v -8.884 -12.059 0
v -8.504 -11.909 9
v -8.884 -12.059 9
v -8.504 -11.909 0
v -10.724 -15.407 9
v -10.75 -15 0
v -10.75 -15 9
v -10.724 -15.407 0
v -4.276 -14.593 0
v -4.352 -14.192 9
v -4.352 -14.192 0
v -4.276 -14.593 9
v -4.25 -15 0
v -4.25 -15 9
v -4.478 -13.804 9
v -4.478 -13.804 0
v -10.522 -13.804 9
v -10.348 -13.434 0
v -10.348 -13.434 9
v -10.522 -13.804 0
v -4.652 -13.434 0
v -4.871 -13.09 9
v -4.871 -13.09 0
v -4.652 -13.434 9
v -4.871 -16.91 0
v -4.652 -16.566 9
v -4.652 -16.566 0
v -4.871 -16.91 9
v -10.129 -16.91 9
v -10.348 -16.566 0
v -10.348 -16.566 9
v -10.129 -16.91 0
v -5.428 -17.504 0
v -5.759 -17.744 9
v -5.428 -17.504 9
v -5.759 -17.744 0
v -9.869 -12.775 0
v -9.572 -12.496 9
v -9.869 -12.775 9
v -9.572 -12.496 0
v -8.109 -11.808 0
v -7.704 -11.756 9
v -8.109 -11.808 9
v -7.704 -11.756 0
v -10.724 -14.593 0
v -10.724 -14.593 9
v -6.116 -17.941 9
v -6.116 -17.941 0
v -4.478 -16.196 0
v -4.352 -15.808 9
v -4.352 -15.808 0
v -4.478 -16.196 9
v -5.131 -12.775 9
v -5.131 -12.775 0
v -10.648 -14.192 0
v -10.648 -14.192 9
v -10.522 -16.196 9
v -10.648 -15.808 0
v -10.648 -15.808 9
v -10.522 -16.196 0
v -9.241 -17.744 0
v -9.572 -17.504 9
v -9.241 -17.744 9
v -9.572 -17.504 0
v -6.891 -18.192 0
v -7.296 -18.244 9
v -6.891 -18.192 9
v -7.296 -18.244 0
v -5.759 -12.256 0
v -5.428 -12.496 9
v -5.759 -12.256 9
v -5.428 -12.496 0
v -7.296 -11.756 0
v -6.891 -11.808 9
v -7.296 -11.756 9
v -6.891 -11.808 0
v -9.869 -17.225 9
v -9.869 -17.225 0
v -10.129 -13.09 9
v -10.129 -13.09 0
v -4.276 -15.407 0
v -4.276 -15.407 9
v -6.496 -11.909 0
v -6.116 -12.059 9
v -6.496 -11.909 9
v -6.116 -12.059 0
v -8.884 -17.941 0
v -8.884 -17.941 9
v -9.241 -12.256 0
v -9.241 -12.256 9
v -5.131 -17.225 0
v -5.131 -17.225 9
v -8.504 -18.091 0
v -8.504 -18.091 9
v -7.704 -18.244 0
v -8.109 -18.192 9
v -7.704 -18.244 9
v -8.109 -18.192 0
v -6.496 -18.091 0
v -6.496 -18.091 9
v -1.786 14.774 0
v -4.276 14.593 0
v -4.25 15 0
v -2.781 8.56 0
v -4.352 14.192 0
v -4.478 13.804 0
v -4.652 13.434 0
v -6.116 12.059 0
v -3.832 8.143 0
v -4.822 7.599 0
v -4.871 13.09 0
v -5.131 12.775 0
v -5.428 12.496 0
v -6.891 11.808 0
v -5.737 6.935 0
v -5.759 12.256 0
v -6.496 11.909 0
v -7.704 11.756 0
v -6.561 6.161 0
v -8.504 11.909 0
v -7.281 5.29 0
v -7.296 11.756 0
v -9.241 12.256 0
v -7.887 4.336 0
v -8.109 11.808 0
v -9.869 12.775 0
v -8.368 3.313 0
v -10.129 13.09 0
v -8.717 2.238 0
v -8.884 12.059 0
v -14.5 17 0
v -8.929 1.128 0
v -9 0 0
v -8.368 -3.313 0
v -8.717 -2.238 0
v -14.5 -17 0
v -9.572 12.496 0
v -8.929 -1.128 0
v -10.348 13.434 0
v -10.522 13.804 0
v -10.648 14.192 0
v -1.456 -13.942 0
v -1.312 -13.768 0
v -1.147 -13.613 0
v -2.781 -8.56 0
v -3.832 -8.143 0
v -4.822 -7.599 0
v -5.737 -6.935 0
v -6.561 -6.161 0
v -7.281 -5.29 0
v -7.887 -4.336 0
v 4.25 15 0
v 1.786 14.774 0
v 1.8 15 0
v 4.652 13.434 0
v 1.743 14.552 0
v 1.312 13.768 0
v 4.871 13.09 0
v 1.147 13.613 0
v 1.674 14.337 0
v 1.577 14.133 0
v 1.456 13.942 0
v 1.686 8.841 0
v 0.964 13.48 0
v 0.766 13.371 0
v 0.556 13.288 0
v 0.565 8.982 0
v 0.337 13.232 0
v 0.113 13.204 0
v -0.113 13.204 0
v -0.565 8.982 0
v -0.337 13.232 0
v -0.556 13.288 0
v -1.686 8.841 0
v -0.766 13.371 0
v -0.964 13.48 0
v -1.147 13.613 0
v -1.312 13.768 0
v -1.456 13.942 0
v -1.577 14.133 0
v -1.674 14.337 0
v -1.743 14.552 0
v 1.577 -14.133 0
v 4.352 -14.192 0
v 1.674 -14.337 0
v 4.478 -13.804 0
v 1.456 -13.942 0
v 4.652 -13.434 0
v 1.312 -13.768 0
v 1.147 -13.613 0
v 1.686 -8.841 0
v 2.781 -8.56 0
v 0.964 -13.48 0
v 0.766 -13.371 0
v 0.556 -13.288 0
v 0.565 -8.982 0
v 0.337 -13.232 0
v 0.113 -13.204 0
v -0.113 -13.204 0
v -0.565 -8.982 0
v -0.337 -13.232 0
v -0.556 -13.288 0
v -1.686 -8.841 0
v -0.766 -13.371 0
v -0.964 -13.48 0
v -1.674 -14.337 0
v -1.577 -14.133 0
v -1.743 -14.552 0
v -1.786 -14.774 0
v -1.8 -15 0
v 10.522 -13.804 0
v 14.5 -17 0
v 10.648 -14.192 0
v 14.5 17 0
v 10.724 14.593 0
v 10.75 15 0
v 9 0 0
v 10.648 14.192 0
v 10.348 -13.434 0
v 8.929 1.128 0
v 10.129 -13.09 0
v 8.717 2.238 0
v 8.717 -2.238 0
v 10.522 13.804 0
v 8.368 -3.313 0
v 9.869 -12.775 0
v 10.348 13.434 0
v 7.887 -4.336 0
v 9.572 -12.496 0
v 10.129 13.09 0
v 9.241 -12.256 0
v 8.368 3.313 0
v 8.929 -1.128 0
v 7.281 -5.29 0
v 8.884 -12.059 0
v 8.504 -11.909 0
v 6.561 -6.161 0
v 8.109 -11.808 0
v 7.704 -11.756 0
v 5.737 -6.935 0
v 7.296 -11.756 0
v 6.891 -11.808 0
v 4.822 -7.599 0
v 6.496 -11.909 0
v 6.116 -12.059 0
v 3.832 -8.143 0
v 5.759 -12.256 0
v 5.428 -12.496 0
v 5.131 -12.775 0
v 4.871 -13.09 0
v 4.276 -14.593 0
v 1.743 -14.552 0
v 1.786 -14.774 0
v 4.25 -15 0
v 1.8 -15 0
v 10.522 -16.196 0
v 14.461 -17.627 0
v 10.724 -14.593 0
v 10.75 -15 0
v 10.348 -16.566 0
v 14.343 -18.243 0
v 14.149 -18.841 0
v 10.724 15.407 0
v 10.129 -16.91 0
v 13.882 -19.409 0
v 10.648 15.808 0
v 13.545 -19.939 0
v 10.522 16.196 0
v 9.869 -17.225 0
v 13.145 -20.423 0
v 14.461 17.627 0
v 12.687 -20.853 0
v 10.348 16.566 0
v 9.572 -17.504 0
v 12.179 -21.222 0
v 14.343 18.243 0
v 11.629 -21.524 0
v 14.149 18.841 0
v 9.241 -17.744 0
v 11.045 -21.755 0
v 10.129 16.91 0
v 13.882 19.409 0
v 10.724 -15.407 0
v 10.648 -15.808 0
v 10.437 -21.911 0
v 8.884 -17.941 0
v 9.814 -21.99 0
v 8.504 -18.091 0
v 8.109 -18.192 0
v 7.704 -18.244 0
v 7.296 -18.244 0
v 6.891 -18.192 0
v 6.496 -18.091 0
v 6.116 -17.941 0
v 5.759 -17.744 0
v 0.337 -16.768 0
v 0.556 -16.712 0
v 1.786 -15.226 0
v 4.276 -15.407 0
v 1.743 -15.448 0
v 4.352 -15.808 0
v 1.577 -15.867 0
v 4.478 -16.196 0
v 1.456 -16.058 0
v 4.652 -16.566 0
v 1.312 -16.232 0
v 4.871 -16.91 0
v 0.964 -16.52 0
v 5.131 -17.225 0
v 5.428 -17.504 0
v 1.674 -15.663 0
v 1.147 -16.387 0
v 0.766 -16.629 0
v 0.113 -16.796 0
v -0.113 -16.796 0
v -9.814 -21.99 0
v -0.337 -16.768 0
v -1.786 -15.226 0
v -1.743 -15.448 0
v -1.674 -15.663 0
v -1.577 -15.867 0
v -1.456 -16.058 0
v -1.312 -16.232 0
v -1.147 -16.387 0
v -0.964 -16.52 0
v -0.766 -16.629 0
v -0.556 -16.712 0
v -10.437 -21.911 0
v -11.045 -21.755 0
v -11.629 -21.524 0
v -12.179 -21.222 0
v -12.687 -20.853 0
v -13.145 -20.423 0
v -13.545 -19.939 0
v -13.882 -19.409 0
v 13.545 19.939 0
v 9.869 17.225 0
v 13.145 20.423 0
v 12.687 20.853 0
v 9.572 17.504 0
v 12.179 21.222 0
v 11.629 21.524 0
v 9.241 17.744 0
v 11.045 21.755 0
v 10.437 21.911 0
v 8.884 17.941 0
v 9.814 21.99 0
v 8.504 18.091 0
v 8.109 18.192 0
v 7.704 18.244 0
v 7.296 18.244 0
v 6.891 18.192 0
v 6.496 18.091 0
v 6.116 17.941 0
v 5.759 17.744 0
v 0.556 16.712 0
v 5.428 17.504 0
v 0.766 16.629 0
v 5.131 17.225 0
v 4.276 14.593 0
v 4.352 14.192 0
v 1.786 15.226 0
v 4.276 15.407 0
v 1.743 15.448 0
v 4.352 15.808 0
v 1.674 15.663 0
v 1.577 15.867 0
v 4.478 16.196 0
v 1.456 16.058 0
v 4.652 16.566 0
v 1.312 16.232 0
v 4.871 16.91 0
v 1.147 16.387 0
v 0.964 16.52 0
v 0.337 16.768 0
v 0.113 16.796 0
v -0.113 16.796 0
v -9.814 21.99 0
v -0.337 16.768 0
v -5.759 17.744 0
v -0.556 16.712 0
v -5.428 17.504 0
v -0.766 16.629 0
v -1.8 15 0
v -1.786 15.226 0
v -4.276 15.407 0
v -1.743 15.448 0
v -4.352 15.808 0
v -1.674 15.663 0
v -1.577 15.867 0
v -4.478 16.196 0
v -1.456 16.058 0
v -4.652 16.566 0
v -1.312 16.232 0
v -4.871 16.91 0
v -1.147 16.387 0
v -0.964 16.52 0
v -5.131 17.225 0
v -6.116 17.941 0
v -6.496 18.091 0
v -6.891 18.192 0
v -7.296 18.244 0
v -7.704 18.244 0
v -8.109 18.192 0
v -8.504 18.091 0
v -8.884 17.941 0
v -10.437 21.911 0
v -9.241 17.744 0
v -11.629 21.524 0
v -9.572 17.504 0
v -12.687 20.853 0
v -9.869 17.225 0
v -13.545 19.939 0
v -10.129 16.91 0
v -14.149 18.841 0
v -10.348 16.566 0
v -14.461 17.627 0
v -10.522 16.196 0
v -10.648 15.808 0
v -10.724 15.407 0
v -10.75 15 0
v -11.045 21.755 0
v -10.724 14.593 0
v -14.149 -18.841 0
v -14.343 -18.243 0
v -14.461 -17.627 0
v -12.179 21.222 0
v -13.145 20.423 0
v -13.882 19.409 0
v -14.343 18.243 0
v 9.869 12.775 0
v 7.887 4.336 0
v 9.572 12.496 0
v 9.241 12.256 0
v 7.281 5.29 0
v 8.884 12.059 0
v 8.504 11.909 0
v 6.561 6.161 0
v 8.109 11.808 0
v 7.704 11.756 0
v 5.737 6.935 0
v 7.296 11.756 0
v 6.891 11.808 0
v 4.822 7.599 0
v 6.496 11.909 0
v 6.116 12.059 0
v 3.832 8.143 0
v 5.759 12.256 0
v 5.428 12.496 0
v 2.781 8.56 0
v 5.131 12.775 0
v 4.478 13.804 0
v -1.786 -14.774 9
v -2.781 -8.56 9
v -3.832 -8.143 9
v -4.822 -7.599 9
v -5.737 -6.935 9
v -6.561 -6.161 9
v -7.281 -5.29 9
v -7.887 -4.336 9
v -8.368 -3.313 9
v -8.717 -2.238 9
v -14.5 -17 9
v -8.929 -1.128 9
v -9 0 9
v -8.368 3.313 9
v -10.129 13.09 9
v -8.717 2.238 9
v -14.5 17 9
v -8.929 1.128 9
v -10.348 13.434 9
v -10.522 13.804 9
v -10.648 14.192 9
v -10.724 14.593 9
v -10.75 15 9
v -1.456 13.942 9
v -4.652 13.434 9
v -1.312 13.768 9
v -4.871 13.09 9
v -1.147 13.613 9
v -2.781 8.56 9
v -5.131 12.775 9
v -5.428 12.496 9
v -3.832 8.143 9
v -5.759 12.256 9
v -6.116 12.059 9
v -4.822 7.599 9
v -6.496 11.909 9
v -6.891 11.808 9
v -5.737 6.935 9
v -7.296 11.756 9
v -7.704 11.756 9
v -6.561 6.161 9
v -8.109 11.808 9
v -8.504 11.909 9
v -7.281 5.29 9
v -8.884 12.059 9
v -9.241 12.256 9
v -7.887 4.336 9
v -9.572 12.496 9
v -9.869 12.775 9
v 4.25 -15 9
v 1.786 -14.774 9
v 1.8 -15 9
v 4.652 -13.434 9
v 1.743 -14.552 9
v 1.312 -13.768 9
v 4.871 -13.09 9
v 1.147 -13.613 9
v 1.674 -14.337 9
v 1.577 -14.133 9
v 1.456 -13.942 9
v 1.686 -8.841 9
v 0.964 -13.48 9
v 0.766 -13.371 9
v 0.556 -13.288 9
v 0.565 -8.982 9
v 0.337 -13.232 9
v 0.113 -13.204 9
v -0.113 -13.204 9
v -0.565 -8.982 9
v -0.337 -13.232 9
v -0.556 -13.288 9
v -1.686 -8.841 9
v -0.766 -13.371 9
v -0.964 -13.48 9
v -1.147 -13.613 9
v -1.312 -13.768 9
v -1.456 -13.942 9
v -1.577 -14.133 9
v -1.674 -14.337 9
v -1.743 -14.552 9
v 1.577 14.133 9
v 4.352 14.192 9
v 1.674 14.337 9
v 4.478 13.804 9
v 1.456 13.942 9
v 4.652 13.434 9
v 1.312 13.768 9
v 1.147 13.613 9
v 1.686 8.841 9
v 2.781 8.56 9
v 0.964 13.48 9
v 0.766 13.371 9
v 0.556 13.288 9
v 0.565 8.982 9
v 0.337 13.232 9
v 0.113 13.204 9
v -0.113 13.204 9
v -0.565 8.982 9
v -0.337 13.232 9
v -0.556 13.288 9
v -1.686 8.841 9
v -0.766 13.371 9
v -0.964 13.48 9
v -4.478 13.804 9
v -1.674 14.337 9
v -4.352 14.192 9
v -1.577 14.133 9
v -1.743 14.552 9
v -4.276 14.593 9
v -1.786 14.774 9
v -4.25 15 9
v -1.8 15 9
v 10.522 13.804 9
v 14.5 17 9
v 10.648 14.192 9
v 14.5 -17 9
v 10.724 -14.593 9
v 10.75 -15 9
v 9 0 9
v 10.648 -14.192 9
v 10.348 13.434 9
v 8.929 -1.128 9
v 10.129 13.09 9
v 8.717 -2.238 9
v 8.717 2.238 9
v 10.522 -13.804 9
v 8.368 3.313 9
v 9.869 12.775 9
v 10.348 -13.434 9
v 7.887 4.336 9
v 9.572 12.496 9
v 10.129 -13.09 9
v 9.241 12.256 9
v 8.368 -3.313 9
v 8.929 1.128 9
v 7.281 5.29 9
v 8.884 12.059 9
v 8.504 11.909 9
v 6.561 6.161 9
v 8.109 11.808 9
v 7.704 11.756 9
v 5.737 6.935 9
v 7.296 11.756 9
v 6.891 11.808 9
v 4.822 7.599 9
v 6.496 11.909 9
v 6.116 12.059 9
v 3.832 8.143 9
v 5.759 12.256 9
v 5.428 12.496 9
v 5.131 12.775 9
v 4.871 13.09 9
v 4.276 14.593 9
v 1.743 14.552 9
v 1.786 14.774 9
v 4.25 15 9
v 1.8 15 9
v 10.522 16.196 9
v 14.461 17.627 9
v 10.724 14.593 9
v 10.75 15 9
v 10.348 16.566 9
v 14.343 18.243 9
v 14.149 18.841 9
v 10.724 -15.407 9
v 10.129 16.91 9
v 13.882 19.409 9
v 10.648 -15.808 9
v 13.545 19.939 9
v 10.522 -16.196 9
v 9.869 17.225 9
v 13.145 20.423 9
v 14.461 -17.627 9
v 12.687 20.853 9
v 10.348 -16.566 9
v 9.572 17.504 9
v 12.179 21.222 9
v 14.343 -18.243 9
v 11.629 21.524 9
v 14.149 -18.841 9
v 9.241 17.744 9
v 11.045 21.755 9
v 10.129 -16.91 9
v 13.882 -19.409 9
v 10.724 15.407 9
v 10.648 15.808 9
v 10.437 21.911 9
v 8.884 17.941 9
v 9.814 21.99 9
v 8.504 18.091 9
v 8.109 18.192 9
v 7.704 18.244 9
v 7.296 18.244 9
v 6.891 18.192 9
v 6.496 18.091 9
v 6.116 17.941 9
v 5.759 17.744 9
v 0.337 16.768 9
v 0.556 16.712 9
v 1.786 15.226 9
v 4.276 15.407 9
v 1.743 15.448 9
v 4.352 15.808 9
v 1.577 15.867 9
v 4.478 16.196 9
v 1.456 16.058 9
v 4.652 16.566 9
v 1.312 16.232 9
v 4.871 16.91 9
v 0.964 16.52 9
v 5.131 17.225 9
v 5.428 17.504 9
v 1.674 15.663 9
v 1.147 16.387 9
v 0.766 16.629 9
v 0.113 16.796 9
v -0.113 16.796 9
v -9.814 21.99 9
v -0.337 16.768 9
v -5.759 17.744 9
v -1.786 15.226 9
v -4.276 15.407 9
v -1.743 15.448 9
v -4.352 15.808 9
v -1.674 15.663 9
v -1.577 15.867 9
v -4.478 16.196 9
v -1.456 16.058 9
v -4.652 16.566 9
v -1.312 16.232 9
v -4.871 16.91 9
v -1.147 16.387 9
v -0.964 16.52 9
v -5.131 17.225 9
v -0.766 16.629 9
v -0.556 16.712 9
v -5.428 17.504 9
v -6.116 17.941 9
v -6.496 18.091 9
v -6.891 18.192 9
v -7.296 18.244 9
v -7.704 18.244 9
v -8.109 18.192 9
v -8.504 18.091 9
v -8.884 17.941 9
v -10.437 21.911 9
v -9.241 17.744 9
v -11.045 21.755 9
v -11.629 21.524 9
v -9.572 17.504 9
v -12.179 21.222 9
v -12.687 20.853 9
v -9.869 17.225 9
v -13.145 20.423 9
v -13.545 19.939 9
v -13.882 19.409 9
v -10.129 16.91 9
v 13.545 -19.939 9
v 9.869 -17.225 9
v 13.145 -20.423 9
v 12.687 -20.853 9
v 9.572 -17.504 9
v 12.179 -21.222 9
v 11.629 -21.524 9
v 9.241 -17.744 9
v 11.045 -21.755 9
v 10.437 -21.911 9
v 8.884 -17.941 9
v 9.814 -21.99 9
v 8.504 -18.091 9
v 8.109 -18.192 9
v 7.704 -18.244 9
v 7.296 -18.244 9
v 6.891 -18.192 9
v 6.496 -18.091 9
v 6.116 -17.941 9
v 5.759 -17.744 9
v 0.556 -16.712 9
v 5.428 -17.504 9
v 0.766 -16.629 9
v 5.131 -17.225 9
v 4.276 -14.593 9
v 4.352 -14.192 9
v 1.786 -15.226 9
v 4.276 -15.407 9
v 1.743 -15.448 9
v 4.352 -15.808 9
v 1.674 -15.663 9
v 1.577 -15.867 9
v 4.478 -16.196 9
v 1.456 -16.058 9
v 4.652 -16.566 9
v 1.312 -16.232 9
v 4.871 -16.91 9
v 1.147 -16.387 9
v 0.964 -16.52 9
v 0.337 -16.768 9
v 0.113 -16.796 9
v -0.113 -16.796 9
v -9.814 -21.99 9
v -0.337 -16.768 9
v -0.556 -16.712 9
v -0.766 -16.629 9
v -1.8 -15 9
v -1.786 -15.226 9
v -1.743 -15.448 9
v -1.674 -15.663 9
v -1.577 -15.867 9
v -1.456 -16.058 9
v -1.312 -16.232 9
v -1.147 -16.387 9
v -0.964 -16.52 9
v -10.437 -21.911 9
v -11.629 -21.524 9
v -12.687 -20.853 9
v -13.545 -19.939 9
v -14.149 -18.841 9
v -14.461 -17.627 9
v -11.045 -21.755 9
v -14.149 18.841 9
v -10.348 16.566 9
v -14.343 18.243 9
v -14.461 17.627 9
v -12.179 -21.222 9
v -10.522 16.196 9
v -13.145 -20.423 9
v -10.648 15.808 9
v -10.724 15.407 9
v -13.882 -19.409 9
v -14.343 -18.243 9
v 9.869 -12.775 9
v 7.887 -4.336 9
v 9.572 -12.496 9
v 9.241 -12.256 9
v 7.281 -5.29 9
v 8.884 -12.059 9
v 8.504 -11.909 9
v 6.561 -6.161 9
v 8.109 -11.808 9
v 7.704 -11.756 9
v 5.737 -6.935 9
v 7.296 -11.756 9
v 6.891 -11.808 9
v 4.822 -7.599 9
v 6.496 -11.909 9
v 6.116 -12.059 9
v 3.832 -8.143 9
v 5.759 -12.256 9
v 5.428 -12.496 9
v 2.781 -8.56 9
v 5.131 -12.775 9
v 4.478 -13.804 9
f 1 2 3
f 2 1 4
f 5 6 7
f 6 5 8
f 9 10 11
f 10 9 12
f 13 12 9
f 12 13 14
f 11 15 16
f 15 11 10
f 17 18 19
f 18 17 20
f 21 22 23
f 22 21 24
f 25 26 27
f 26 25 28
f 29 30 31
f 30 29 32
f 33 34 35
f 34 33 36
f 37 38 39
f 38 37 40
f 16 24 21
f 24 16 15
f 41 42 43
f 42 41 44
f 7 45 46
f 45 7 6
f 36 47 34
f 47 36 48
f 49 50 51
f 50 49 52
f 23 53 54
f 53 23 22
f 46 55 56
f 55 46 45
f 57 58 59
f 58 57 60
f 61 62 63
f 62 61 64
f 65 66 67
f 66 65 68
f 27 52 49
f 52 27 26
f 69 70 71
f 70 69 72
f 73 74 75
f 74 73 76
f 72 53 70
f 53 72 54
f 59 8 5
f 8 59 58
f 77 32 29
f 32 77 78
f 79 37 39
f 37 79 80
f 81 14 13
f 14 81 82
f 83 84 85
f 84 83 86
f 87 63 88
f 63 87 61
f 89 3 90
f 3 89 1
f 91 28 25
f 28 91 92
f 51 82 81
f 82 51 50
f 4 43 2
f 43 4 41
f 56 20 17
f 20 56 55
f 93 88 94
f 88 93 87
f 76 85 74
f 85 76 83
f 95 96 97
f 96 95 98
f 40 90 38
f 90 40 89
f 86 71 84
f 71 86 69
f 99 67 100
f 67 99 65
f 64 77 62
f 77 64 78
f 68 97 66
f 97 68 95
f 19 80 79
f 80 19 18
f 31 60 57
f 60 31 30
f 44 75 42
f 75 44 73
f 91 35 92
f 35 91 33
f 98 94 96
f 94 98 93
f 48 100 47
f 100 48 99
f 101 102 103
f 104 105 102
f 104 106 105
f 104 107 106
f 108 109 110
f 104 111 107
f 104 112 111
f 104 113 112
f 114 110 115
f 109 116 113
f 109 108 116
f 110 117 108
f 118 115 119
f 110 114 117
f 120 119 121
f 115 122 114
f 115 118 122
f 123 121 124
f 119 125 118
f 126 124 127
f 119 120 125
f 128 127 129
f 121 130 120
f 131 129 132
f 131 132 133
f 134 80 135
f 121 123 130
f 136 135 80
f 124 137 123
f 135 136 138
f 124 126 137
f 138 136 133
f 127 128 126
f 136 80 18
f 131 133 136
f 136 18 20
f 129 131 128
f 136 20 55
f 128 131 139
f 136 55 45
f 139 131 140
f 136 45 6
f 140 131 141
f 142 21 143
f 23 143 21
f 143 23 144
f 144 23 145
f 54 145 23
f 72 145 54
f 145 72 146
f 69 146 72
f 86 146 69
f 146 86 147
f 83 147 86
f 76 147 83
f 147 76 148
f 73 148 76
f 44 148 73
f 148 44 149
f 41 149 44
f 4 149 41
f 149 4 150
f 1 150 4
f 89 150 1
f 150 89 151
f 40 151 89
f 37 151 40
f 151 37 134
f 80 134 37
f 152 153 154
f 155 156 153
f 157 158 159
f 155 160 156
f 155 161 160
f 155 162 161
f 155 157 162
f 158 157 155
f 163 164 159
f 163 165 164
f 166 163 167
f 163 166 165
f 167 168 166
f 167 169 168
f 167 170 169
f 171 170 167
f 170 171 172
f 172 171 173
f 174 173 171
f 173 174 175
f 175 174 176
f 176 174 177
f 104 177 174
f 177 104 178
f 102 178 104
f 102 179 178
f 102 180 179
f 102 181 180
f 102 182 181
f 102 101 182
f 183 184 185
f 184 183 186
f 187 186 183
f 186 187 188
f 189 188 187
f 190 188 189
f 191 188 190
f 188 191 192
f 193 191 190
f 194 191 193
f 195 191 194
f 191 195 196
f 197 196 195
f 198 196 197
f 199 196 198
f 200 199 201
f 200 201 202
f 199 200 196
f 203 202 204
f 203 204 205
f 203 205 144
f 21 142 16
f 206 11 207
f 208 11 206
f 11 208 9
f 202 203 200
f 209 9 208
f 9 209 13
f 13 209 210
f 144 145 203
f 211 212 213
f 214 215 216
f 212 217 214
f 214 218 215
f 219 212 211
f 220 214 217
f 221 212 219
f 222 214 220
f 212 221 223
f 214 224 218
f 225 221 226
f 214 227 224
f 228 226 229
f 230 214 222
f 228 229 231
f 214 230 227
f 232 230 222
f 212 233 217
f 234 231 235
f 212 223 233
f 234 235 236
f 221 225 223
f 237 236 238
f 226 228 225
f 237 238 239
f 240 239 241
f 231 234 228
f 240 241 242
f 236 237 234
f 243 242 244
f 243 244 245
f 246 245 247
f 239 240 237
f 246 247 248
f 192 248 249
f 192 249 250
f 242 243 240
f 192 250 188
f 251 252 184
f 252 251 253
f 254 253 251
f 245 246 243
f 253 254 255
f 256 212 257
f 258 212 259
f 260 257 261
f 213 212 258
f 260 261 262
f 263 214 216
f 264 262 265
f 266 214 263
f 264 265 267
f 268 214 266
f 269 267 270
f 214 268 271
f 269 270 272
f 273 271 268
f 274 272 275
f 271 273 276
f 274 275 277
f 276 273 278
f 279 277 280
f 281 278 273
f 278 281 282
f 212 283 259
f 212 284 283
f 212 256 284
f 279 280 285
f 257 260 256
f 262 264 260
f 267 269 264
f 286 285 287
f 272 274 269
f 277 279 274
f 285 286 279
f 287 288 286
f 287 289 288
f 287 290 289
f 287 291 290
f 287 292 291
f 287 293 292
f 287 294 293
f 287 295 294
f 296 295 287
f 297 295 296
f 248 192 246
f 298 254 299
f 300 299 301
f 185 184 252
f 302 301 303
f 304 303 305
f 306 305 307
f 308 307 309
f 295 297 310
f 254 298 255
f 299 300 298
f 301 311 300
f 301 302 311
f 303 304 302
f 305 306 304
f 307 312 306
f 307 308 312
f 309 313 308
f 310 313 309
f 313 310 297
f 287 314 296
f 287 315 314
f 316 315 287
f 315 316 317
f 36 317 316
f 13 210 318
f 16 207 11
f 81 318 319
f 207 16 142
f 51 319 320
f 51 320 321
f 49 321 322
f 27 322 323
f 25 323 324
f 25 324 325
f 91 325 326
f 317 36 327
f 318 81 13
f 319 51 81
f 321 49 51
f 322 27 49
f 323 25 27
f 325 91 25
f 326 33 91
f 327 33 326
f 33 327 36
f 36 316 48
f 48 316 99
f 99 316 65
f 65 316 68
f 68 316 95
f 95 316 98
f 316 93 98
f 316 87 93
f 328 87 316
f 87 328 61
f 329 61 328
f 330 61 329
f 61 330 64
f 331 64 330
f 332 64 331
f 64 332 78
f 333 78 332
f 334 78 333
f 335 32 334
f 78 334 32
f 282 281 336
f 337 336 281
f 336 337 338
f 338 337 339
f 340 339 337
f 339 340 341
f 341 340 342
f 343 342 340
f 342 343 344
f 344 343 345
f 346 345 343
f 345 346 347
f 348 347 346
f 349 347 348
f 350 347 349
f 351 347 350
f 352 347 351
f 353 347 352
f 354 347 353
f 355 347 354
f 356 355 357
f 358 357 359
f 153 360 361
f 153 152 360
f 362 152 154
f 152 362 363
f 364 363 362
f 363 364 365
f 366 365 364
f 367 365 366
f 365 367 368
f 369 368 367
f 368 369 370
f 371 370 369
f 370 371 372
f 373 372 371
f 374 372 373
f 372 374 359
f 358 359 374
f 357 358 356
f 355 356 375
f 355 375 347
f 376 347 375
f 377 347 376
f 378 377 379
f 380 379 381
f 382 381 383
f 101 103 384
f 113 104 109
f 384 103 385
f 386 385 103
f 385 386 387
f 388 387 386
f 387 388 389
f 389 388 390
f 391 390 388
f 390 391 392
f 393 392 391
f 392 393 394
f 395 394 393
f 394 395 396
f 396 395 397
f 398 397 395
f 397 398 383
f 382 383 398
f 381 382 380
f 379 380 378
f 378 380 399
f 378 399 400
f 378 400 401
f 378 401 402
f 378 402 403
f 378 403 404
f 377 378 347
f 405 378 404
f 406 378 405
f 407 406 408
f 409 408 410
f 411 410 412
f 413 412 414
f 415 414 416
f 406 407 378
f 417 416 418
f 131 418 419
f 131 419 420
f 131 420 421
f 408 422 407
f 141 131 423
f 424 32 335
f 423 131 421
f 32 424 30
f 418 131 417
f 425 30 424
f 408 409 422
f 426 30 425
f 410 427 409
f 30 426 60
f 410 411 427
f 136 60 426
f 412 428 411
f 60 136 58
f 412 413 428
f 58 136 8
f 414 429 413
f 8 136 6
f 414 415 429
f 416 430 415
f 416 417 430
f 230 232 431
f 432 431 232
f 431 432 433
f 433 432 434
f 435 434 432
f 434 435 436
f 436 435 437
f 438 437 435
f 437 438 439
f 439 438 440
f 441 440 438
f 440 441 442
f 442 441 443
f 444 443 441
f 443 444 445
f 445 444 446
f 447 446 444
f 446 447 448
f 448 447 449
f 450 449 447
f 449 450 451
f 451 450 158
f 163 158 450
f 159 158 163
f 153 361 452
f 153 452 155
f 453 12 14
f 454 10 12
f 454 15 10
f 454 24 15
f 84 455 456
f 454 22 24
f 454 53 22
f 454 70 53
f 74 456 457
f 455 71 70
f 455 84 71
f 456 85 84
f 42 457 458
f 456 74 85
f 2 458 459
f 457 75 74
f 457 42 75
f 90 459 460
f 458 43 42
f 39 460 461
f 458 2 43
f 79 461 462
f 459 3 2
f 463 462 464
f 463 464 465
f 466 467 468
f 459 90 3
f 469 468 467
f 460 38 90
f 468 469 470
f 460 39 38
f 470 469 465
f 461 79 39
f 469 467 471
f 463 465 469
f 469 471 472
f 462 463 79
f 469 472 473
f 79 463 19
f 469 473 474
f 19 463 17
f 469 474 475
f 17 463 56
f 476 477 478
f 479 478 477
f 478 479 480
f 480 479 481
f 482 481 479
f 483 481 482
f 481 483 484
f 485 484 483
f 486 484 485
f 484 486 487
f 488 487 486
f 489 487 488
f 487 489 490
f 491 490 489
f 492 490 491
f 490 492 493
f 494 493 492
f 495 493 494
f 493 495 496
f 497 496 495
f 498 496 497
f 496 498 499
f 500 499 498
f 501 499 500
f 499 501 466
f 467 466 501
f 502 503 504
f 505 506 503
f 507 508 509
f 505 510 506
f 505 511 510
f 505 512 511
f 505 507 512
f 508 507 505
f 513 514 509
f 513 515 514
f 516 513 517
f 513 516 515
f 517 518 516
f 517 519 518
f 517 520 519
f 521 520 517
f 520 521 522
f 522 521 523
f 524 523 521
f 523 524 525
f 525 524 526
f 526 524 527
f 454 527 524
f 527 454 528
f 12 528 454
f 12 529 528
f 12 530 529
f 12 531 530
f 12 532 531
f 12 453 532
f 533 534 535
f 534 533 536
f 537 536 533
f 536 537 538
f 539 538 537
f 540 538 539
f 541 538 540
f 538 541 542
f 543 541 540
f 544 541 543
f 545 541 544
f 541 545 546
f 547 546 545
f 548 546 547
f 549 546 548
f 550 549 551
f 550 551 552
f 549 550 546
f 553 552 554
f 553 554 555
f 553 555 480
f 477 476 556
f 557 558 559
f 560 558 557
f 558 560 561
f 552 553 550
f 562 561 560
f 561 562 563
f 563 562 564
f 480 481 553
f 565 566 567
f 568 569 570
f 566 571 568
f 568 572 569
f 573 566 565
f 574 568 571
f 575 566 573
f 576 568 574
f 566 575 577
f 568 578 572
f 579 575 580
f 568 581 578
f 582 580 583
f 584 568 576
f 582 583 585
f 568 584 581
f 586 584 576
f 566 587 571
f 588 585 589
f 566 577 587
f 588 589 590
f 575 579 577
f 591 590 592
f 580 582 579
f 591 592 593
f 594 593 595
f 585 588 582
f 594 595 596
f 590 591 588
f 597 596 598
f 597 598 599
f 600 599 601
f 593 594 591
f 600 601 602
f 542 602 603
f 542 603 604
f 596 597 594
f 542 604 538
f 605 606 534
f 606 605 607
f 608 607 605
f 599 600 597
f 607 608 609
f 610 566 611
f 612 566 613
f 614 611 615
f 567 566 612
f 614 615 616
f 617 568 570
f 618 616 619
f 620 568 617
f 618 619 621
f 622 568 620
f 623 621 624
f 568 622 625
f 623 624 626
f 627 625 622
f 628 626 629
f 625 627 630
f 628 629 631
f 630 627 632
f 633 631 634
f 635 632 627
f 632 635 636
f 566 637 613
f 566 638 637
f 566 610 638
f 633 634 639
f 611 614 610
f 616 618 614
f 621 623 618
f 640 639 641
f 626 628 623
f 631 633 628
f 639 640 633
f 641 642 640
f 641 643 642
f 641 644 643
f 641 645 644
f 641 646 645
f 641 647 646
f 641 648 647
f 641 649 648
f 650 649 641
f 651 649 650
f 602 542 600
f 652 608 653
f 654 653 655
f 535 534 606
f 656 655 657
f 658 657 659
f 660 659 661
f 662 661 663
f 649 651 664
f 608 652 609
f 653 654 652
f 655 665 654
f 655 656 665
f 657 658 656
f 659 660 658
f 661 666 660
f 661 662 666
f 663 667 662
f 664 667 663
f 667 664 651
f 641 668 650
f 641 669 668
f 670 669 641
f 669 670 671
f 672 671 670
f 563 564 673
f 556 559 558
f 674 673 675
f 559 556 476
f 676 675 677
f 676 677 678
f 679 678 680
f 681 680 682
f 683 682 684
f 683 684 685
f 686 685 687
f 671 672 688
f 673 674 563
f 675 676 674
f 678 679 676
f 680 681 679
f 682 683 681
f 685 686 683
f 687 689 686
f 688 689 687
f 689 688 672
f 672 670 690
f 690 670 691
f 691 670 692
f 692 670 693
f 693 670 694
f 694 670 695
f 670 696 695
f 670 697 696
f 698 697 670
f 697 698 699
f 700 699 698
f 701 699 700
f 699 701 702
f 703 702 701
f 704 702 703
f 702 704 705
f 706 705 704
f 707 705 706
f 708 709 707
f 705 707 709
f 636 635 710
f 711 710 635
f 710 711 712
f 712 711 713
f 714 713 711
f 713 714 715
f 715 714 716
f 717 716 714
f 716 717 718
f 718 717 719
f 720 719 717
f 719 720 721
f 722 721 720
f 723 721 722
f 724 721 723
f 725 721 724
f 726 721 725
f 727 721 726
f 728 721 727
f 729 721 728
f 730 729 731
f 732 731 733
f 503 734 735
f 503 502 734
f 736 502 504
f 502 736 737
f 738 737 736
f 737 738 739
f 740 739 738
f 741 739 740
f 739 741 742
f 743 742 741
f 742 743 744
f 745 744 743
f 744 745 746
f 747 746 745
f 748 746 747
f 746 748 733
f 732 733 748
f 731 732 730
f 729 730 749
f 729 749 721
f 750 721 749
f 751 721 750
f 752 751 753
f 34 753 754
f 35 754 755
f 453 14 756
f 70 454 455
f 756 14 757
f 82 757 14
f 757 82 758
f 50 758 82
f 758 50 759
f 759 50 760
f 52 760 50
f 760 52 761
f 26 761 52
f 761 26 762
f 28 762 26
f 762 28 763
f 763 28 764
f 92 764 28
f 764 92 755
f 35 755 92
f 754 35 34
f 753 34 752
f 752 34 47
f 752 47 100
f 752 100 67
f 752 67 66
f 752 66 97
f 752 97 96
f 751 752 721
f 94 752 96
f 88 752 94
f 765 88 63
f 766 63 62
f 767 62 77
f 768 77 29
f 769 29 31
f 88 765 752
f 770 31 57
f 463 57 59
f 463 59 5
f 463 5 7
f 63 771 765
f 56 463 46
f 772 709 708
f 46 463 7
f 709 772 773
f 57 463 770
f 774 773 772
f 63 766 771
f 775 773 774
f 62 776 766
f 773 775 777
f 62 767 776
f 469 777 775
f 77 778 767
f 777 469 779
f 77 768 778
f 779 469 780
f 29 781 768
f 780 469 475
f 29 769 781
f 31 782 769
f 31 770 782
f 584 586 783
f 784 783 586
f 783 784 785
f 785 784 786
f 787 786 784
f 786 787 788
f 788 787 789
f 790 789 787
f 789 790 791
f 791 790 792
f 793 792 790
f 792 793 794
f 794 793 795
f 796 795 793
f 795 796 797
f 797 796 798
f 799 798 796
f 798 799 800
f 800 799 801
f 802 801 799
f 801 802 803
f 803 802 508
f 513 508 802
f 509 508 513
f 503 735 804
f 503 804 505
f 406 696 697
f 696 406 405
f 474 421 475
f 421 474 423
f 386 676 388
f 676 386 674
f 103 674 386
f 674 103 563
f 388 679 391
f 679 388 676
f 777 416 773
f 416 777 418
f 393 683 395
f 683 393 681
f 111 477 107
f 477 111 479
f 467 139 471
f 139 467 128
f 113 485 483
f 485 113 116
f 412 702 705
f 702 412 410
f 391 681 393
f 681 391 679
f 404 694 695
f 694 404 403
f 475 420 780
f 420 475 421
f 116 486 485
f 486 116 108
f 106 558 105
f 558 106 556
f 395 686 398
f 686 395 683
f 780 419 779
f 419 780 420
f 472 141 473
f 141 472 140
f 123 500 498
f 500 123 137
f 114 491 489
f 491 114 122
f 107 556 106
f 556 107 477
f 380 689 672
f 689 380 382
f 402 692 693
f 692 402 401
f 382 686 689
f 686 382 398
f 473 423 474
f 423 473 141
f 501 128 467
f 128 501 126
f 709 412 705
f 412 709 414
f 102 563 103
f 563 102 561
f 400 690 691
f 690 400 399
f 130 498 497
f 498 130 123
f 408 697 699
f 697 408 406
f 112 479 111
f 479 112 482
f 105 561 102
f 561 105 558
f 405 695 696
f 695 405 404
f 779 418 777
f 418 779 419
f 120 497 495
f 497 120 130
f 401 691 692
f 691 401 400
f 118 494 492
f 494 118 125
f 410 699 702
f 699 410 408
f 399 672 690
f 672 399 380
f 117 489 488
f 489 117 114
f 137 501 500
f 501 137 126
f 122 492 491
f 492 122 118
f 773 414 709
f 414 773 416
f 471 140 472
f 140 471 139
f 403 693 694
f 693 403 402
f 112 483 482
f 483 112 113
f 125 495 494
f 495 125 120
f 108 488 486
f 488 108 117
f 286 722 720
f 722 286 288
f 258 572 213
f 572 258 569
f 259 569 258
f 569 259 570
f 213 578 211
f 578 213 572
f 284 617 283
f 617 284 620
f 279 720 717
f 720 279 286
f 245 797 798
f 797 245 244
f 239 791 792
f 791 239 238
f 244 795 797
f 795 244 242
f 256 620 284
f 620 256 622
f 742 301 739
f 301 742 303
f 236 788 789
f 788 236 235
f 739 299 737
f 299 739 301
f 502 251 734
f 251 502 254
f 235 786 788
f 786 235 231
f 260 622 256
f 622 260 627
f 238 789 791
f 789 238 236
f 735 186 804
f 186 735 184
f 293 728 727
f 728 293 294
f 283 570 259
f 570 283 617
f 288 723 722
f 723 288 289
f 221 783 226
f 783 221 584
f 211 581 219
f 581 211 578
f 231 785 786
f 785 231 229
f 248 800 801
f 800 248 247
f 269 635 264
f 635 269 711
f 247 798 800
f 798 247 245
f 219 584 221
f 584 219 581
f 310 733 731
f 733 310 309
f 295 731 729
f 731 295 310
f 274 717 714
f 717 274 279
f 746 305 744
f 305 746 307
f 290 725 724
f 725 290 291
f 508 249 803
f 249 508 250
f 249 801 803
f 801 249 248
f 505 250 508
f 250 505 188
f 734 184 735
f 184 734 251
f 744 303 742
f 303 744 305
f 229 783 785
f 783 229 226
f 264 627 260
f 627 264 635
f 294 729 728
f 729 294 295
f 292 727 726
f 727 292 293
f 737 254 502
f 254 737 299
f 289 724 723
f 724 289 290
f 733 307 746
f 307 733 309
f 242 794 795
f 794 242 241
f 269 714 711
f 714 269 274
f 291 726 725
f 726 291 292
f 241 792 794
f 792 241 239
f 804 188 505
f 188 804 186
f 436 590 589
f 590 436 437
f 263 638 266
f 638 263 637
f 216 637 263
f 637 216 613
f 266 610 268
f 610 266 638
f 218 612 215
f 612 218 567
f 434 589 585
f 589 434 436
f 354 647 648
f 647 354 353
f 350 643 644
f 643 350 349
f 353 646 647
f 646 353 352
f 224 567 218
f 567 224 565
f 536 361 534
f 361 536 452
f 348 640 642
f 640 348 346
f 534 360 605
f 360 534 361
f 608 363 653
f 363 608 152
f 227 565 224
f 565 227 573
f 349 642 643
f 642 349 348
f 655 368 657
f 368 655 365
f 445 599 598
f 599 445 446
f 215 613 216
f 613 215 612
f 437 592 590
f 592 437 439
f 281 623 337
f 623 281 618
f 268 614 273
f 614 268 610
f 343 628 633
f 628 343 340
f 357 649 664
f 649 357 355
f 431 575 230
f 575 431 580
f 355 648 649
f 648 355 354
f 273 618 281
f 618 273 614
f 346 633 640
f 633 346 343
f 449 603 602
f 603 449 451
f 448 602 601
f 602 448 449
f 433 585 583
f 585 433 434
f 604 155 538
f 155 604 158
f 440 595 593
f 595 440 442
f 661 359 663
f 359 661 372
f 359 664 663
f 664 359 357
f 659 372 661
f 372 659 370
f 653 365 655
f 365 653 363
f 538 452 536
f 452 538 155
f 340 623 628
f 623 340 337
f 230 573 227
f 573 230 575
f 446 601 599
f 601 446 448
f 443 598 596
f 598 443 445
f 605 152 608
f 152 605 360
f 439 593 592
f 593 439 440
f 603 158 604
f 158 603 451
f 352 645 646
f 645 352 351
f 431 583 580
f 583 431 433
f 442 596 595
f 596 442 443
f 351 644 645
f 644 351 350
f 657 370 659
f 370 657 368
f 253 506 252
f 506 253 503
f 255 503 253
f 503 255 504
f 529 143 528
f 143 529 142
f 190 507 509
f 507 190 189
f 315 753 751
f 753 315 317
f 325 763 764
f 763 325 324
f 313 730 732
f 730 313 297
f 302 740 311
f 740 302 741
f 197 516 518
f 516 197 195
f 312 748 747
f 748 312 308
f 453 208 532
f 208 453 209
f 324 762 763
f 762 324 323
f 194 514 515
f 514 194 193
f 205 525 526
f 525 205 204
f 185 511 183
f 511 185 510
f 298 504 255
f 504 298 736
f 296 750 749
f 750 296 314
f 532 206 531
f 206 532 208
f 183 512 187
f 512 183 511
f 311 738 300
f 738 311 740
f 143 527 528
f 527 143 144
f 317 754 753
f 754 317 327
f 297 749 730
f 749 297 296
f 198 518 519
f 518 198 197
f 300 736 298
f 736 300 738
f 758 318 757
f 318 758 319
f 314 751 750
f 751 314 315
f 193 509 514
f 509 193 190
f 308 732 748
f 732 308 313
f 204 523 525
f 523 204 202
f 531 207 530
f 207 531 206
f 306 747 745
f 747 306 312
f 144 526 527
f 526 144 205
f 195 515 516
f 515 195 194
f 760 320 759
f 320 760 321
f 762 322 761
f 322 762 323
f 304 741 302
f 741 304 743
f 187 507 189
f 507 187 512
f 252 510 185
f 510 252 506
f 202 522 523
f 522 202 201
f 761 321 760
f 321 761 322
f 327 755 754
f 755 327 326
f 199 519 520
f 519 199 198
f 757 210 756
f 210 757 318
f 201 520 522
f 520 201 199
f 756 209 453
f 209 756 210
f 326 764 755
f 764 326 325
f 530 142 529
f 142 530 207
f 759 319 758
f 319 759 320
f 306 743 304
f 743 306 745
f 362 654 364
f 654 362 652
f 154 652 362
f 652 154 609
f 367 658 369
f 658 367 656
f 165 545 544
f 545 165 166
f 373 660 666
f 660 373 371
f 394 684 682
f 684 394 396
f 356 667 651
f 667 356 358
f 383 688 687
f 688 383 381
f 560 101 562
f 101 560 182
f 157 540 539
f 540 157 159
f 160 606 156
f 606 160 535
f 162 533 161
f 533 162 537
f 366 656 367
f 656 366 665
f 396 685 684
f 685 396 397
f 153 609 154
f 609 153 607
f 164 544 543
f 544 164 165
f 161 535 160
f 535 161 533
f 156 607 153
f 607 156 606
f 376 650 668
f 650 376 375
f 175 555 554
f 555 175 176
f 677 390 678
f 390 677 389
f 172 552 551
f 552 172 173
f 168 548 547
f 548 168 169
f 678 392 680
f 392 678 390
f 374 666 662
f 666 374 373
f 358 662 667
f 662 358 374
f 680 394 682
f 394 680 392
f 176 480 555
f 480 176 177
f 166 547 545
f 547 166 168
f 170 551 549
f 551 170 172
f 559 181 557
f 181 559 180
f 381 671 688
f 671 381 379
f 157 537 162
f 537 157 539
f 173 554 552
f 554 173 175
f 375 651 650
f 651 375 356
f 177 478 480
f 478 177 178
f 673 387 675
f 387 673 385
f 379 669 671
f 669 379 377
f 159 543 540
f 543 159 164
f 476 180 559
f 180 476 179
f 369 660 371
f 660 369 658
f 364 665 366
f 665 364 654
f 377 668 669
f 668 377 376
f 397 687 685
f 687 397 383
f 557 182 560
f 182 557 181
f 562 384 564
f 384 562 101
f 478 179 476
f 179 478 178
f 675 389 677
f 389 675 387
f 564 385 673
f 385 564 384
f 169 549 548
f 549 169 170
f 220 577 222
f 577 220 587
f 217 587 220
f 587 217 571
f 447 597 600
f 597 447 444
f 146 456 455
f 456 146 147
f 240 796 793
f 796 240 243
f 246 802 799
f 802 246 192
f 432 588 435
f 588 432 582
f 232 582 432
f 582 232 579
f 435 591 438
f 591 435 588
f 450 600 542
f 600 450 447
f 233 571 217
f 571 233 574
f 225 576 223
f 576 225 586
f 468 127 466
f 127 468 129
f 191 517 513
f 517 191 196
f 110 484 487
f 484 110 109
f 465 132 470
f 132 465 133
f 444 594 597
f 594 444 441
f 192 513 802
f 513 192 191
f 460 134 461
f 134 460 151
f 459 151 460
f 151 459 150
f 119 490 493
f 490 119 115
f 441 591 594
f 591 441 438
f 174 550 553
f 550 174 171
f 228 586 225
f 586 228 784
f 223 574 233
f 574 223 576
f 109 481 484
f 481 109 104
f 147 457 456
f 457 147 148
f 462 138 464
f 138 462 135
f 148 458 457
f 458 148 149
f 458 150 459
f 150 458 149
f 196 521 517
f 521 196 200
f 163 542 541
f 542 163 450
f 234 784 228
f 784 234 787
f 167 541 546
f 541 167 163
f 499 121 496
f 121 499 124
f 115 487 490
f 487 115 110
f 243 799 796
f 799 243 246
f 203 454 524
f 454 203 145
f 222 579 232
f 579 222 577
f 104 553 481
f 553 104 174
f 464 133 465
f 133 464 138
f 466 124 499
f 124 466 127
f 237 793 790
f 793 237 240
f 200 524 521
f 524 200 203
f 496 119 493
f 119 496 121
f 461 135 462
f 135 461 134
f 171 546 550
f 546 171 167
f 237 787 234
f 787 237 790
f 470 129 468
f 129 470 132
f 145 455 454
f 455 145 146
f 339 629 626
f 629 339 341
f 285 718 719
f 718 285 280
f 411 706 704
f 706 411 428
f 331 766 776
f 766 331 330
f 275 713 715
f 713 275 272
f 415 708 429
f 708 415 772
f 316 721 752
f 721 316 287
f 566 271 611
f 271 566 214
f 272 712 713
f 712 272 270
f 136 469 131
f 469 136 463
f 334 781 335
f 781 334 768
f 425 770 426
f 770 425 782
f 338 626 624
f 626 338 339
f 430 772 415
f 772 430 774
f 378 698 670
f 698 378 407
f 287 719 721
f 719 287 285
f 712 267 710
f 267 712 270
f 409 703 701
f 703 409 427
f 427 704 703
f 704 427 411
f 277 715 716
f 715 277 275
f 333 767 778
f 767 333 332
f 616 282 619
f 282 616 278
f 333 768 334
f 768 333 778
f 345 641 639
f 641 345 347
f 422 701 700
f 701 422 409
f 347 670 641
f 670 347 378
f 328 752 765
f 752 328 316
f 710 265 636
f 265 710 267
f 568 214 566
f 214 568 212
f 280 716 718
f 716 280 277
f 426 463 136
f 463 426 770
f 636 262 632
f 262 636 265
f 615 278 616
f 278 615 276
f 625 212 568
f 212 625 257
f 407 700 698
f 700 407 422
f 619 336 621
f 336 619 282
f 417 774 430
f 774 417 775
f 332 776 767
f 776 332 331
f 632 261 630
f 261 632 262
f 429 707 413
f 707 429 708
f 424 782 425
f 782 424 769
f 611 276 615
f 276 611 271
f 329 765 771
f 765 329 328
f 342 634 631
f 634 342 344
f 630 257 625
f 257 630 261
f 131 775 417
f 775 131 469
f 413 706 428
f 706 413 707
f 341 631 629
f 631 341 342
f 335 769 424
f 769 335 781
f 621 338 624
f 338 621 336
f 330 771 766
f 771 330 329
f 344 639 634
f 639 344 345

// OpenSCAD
$fn = 50;

difference() {
	union() {
		hull() {
			translate(v = [-9.5, 17.0, 0]) {
				cylinder(h = 9, r = 5);
			}
			translate(v = [9.5, 17.0, 0]) {
				cylinder(h = 9, r = 5);
			}
			translate(v = [-9.5, -17.0, 0]) {
				cylinder(h = 9, r = 5);
			}
			translate(v = [9.5, -17.0, 0]) {
				cylinder(h = 9, r = 5);
			}
		}
	}
	union() {
		translate(v = [-7.5, -15.0, 0]) {
			cylinder(h = 9, r = 3.25);
		}
		translate(v = [-7.5, 15.0, 0]) {
			cylinder(h = 9, r = 3.25);
		}
		translate(v = [7.5, -15.0, 0]) {
			cylinder(h = 9, r = 3.25);
		}
		translate(v = [7.5, 15.0, 0]) {
			cylinder(h = 9, r = 3.25);
		}
		translate(v = [0.0, -15.0, 0]) {
			cylinder(h = 9, r = 1.8);
		}
		translate(v = [0.0, 15.0, 0]) {
			cylinder(h = 9, r = 1.8);
		}
		cylinder(h = 9, r = 9.0);
	}
}
